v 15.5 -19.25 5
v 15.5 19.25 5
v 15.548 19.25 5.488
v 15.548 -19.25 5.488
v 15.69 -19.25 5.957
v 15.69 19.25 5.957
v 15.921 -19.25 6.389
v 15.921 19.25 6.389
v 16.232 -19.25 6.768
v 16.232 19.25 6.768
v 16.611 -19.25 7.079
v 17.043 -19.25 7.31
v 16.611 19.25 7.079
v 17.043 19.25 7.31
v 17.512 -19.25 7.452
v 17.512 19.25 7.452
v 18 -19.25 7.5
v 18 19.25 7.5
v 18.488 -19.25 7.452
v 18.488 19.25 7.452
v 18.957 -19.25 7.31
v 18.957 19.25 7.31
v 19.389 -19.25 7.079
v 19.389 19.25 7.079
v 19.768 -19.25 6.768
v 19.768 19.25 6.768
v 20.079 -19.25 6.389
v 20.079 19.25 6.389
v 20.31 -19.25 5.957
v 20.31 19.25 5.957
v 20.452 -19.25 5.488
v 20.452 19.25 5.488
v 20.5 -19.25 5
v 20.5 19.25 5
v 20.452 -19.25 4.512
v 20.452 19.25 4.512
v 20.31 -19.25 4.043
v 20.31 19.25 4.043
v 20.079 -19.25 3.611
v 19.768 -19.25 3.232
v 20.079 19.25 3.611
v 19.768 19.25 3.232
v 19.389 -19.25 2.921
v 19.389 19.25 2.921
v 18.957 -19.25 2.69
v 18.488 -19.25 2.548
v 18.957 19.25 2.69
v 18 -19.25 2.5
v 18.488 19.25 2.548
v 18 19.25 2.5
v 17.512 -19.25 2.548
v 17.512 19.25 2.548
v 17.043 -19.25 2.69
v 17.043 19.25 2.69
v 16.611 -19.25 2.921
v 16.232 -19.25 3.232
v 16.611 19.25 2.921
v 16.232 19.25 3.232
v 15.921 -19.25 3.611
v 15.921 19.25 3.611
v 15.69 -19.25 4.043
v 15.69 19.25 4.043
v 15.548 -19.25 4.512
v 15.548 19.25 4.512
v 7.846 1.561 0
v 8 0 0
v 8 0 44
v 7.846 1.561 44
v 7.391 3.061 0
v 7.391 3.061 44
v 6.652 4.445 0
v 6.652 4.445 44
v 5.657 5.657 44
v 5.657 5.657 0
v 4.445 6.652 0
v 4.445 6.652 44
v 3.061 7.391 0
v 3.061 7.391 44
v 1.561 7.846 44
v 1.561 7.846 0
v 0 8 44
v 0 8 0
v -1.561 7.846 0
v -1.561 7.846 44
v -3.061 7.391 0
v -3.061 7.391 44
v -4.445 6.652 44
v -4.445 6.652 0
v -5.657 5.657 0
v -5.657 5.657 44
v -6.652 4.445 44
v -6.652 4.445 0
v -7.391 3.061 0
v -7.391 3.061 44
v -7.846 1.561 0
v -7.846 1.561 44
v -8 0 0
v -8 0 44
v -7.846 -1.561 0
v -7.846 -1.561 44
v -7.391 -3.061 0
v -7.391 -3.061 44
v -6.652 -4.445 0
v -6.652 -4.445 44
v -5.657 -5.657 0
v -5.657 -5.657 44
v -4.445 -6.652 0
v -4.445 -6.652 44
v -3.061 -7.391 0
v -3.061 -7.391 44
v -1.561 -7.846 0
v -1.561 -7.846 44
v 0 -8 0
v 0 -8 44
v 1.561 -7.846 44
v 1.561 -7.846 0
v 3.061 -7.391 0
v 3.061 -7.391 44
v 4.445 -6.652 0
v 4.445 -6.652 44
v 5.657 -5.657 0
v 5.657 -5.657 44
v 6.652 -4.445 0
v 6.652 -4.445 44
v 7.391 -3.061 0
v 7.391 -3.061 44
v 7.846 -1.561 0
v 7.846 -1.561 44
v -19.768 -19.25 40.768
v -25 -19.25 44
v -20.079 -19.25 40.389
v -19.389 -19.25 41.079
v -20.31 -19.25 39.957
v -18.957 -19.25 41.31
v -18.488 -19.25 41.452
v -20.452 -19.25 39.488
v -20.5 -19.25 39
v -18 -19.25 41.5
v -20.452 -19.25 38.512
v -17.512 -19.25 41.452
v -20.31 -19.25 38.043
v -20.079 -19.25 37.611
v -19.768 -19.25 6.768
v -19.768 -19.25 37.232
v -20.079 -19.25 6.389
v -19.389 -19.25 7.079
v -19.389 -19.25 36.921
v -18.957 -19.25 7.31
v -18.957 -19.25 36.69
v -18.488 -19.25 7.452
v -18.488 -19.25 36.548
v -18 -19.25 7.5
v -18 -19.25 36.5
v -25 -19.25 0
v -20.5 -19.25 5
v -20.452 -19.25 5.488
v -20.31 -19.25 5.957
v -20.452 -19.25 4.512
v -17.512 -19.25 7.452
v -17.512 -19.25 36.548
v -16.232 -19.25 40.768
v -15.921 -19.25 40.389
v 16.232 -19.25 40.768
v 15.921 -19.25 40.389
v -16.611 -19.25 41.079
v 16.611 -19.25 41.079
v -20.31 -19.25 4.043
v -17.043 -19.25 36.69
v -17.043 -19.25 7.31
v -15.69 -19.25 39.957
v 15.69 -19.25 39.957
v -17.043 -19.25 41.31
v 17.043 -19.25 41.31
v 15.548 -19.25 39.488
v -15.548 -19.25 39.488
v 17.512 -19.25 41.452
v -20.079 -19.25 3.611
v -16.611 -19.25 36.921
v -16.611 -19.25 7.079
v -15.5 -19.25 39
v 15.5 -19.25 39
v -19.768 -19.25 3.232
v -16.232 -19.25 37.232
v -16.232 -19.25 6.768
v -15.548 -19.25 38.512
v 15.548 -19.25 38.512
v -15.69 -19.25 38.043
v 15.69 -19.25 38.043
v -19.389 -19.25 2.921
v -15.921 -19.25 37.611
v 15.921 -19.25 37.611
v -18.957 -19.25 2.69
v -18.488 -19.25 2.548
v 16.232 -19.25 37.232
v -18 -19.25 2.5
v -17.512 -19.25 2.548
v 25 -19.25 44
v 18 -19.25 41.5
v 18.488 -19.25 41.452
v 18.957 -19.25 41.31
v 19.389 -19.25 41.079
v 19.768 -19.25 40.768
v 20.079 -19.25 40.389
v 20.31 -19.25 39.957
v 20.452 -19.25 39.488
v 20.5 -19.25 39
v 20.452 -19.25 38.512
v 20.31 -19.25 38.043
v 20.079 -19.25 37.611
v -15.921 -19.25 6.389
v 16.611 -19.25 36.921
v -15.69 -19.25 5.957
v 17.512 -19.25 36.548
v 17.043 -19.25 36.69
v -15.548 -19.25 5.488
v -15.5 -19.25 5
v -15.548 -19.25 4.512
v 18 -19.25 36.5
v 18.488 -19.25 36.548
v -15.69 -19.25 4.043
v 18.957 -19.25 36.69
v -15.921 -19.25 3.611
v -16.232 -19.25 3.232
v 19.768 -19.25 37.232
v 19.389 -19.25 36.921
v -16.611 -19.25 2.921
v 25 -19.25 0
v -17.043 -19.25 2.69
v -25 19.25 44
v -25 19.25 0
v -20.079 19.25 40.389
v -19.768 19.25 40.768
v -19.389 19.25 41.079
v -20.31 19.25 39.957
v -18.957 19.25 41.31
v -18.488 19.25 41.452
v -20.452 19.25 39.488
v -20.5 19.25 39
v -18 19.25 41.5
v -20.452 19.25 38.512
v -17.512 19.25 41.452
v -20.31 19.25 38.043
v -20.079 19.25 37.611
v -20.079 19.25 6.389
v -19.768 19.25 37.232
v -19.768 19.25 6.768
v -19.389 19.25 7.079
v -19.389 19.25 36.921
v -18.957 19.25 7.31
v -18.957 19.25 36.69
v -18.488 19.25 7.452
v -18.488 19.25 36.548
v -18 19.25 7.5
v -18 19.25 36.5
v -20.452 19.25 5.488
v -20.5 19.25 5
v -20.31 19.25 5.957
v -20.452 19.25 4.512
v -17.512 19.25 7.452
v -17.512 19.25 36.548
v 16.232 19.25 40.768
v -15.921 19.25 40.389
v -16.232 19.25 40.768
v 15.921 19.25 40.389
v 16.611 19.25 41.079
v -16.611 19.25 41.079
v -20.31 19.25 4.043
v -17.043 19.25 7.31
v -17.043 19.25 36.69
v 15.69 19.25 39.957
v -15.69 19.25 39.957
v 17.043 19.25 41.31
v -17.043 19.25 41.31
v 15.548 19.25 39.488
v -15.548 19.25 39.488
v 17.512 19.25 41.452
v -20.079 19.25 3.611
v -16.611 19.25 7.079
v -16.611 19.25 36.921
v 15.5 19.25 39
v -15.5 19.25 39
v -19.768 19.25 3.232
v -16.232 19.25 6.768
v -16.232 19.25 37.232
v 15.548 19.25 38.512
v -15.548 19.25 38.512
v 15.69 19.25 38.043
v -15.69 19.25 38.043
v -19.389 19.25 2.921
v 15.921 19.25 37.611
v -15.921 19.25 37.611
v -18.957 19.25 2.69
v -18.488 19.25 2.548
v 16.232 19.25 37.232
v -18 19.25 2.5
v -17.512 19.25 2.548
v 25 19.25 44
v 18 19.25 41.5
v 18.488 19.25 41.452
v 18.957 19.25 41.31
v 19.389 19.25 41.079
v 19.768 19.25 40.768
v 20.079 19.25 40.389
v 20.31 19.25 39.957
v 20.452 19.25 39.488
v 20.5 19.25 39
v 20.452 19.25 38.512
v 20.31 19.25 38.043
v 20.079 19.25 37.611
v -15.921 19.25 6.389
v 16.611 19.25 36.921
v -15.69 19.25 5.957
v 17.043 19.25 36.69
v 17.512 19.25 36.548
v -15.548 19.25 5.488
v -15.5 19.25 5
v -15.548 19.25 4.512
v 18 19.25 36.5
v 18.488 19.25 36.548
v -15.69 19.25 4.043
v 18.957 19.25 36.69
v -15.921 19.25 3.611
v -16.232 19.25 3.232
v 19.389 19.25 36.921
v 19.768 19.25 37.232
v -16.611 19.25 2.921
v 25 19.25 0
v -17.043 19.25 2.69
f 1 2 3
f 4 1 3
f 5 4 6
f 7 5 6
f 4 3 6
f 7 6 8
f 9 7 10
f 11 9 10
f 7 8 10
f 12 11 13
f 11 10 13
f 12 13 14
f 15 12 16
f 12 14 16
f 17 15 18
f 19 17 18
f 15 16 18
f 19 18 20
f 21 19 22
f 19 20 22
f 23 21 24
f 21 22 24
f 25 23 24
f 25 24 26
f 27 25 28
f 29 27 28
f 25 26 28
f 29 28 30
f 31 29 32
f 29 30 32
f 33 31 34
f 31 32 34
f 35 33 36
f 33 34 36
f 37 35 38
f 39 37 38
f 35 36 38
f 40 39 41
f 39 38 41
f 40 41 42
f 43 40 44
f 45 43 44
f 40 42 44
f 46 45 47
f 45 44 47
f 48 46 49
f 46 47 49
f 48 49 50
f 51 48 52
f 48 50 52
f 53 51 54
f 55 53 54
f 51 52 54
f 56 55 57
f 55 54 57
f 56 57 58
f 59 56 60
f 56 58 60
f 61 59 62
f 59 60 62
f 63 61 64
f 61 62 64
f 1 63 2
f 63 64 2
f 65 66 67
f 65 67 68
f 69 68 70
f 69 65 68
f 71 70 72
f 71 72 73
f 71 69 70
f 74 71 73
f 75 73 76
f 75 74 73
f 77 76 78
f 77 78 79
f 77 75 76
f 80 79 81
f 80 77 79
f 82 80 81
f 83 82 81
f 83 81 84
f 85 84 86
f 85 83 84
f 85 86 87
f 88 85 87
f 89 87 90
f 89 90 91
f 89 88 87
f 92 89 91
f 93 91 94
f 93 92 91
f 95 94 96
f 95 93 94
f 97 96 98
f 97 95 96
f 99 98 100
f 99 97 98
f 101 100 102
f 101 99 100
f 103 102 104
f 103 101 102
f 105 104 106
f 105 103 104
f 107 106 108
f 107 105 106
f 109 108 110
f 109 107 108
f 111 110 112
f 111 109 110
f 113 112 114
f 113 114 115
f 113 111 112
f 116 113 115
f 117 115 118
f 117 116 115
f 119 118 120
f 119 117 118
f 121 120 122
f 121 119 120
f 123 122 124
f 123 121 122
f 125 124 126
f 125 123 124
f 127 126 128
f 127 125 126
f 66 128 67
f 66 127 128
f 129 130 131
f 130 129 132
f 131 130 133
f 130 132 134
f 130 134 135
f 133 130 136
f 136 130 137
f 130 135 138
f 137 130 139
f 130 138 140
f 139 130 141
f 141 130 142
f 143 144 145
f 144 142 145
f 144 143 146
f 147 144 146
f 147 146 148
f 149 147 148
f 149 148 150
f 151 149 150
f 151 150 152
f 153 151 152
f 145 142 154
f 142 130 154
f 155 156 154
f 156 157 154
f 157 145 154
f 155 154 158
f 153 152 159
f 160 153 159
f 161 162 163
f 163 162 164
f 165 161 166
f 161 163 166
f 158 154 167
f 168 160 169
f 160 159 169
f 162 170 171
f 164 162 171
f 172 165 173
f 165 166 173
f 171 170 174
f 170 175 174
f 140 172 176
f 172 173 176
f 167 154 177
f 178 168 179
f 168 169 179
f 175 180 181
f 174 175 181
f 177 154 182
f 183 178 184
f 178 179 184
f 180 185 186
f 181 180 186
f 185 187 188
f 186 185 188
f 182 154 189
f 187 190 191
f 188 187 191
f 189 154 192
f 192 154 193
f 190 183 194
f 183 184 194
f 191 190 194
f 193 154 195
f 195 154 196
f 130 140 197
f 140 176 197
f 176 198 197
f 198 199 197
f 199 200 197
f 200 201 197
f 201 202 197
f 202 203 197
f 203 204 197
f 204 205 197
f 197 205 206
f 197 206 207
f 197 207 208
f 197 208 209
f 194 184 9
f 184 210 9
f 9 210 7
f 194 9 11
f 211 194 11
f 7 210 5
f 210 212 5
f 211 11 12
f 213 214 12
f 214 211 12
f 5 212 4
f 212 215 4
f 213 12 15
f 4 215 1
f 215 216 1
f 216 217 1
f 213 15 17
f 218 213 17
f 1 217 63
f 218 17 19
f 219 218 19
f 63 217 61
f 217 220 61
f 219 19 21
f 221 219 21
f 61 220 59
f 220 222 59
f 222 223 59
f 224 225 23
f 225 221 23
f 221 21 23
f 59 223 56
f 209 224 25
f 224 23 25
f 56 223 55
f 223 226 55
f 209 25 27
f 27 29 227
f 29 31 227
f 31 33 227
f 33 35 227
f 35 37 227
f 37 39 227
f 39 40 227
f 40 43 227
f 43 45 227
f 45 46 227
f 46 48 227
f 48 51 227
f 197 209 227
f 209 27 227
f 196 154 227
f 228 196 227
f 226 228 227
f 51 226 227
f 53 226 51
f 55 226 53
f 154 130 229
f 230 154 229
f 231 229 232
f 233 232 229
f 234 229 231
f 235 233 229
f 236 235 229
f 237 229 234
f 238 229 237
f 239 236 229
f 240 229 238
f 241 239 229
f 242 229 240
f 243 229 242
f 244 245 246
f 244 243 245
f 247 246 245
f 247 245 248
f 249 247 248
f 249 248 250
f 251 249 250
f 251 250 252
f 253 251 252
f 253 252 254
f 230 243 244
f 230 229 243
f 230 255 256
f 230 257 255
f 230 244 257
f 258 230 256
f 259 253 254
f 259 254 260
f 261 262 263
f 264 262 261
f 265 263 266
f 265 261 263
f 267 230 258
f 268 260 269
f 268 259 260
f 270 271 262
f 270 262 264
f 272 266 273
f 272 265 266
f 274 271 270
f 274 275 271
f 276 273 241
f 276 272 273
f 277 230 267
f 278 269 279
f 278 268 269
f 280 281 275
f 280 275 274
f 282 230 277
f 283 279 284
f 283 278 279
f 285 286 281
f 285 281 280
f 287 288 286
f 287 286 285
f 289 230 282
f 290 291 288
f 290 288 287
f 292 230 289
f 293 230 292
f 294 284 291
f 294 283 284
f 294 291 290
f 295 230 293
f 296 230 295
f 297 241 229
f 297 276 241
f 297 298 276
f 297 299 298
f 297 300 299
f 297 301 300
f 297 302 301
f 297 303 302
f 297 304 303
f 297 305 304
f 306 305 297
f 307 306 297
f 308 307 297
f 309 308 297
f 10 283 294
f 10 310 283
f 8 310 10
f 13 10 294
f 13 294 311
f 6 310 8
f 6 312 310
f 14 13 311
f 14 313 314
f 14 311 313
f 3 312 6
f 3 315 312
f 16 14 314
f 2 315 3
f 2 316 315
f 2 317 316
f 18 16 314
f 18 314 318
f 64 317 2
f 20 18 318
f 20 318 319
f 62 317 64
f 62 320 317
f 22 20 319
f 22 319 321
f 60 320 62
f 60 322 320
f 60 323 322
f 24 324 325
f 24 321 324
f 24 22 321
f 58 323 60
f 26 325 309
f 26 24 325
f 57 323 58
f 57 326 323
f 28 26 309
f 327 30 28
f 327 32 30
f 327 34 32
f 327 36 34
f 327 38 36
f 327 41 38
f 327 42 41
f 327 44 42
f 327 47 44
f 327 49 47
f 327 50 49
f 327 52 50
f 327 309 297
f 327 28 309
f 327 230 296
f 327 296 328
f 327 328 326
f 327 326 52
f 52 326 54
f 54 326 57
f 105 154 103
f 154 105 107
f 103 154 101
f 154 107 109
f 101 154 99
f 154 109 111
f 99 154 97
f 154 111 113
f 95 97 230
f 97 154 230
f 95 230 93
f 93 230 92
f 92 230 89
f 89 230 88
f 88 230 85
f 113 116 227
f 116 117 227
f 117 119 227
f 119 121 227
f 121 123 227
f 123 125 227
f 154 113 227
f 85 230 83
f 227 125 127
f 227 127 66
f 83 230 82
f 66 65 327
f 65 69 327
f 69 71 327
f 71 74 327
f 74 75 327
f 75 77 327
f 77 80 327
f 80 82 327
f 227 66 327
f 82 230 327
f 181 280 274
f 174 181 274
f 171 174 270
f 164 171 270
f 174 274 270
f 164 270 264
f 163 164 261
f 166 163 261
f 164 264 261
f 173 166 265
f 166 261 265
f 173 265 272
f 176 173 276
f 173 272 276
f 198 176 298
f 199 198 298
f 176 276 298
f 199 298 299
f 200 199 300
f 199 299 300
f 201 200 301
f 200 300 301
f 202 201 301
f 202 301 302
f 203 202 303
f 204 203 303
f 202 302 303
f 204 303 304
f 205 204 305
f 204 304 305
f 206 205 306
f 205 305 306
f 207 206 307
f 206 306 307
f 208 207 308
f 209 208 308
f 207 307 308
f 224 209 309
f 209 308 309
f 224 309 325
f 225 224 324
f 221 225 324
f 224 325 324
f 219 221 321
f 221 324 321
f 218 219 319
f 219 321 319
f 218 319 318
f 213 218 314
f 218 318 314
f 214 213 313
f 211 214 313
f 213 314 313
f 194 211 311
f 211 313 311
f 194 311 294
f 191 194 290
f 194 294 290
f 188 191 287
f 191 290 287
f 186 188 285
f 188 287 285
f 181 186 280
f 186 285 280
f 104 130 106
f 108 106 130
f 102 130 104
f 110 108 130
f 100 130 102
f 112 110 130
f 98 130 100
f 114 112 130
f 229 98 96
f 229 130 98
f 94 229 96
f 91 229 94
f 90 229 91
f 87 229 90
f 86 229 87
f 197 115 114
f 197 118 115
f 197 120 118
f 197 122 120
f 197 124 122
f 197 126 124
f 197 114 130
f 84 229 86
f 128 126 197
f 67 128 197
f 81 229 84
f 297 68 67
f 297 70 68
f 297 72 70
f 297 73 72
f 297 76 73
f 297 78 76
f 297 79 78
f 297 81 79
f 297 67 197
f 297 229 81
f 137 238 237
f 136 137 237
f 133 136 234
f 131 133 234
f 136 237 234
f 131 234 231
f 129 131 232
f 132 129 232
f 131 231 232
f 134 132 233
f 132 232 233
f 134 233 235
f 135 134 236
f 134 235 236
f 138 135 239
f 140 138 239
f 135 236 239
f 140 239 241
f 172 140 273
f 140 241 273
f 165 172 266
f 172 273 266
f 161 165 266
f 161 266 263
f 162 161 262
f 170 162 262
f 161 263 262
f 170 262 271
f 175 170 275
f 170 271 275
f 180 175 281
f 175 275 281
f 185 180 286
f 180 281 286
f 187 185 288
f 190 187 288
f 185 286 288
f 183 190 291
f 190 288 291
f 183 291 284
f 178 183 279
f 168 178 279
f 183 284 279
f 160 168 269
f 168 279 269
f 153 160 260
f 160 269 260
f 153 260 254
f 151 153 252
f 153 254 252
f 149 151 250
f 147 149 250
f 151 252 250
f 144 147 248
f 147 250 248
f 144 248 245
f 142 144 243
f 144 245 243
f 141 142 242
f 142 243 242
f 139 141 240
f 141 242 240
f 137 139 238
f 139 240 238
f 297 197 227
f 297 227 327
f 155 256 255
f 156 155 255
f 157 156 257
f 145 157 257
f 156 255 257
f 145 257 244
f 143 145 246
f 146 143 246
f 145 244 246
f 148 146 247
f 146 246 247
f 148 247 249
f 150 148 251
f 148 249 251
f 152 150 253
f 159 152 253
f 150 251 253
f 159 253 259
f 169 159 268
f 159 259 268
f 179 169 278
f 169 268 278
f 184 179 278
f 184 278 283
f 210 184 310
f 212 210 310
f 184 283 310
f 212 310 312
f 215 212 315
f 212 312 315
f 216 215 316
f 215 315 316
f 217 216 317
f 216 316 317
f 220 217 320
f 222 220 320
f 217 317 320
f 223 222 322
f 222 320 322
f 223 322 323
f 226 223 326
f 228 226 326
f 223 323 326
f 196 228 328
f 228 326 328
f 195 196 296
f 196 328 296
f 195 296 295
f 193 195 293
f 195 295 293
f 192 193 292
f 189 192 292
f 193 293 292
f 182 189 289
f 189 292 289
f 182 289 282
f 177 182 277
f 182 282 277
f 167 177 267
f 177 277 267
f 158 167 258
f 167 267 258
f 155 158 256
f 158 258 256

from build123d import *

# Parameters (mm, degrees)
F0_W     = 50
F0_H     = 38.5
F0_R     = 8
F1_DEPTH = 44
F2_R     = 2.5
F3_DEPTH = 38.5


with BuildPart() as f1:
    # F0 (on Top) → F1 (new body)
    with BuildSketch(Plane.XY):
        Rectangle(F0_W, F0_H)
        Circle(F0_R, mode=Mode.SUBTRACT)
    extrude(amount=F1_DEPTH)

    # F2 (on face) → F3 (cut)
    with BuildSketch(Plane(origin=(0, 19.25, 0), x_dir=(-1, 0, 0), z_dir=(0, 1, 0))):
        with Locations((18, 39)):
            Circle(F2_R)
        with Locations((18, 5)):
            Circle(F2_R)
        with Locations((-18, 39)):
            Circle(F2_R)
        with Locations((-18, 5)):
            Circle(F2_R)
    extrude(amount=-F3_DEPTH, mode=Mode.SUBTRACT)


solid = f1.part
